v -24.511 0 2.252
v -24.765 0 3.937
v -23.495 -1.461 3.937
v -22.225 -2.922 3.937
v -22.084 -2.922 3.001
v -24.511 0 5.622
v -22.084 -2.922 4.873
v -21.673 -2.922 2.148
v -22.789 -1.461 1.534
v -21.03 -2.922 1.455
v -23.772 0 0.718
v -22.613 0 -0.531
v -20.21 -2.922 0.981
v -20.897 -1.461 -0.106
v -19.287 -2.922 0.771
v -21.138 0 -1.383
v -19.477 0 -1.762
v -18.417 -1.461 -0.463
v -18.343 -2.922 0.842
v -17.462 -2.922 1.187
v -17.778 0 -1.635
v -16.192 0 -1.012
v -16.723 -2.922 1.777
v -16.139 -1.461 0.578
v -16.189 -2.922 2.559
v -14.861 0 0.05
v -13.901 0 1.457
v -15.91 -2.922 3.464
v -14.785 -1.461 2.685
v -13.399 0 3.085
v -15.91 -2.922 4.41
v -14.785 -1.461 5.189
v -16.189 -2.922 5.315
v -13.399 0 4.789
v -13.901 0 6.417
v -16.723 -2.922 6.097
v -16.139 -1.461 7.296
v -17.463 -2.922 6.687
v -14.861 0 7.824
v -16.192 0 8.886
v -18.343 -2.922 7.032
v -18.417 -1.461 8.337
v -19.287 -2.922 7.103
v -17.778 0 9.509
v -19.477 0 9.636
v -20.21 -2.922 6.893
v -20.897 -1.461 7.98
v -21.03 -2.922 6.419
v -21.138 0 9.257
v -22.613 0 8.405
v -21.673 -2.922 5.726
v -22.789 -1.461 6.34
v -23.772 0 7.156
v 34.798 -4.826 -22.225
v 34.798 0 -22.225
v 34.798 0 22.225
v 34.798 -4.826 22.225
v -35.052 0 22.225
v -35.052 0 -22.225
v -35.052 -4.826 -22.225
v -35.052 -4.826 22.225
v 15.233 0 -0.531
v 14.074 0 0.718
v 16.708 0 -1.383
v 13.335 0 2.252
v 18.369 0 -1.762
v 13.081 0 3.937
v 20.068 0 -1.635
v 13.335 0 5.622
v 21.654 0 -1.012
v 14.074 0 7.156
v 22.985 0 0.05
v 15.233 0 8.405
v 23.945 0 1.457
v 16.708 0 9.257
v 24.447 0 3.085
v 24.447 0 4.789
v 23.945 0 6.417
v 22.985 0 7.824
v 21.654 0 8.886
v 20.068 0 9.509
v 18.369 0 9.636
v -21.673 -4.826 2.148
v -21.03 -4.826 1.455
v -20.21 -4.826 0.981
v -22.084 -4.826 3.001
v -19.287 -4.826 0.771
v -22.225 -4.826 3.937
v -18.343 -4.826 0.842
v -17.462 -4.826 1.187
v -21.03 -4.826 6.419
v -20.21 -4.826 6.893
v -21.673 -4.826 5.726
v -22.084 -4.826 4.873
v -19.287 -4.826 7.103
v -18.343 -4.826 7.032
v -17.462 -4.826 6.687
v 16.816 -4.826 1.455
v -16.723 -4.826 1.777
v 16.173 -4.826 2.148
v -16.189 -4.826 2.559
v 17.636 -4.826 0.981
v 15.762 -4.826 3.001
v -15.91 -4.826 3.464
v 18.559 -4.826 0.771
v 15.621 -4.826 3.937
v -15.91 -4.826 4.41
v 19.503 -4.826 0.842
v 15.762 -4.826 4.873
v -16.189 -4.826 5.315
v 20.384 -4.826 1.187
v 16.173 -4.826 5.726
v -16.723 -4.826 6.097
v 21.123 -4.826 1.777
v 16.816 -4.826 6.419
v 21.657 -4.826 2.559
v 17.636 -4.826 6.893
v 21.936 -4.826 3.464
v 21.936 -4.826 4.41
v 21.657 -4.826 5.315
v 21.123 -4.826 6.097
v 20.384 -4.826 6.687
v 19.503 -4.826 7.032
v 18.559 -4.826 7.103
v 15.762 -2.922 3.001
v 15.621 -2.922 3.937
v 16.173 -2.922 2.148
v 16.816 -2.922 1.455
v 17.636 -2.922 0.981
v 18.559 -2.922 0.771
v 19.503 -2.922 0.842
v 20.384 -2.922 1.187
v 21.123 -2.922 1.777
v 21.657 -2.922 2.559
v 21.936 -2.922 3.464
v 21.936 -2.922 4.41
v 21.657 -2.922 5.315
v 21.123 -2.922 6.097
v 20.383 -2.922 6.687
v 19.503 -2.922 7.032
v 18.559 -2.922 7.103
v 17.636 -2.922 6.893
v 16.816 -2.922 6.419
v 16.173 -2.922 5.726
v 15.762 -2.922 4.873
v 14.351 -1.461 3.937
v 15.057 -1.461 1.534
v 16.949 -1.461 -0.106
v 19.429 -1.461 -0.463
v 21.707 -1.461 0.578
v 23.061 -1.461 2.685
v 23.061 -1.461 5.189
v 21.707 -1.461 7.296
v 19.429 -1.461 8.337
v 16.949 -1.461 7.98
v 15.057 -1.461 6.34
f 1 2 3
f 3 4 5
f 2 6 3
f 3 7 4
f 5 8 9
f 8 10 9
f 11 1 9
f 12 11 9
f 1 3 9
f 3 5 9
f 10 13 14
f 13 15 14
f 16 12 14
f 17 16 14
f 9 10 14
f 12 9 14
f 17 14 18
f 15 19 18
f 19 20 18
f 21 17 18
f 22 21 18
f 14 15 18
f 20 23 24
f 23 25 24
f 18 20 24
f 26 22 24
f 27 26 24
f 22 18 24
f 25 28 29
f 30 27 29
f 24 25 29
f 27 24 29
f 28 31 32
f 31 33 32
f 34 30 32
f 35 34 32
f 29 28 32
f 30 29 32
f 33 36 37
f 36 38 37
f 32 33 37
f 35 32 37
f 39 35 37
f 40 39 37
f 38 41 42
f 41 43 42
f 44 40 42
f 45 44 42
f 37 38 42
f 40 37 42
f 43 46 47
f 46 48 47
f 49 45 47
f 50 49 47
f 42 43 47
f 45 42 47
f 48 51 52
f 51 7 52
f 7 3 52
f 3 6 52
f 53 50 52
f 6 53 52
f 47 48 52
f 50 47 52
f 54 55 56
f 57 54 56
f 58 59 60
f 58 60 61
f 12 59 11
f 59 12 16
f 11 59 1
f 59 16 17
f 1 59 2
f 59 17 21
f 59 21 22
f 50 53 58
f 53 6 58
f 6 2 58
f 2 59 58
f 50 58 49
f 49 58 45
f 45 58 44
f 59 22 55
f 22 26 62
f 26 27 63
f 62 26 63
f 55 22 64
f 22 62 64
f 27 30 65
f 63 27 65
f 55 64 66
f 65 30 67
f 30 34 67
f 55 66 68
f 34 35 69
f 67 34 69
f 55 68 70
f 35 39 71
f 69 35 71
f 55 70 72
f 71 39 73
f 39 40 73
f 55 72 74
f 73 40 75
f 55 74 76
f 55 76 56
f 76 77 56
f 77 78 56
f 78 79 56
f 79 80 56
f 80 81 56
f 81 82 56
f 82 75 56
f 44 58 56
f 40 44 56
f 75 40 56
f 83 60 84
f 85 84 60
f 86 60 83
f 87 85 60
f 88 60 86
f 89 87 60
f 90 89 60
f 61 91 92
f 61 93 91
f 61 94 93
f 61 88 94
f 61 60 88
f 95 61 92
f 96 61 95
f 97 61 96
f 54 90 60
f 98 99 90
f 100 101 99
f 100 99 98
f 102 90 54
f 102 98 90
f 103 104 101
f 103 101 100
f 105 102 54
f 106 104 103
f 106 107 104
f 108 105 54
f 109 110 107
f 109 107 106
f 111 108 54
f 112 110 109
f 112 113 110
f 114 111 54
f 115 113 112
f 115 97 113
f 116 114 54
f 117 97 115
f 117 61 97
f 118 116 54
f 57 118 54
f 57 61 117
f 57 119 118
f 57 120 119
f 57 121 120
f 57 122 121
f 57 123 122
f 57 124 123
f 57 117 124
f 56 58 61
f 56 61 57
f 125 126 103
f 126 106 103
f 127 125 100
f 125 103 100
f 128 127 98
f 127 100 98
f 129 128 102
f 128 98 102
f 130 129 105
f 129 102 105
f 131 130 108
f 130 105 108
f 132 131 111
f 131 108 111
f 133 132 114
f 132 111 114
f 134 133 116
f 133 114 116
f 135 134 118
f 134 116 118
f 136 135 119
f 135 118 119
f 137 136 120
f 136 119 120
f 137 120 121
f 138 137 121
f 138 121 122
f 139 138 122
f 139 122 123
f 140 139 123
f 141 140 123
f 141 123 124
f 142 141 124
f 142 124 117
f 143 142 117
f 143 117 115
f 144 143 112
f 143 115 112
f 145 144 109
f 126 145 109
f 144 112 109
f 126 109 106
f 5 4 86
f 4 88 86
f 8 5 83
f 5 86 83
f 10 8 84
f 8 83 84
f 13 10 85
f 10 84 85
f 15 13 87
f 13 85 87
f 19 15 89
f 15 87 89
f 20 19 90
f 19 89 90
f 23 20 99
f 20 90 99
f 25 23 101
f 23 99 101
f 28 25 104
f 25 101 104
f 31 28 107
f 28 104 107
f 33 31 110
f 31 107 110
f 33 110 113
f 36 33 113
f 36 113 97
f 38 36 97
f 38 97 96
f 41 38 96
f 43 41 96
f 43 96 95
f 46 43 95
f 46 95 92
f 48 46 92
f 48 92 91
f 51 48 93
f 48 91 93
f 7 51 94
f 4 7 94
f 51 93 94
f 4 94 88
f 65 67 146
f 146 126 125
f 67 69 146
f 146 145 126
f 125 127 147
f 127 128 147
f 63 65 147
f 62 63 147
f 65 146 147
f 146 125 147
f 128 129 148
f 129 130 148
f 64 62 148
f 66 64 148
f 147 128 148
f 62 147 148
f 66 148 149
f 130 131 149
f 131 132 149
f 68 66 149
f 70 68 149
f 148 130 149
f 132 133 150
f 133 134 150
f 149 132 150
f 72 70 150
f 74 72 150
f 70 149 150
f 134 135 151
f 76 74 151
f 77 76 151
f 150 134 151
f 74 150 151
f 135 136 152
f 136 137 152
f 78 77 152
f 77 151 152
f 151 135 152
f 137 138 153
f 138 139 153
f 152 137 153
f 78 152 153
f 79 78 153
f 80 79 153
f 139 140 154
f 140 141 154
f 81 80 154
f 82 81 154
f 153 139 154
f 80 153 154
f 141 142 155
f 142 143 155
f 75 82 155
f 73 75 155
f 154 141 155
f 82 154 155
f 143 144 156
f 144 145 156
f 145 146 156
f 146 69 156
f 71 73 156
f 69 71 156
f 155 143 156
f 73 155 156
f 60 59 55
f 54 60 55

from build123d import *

# Parameters (mm, degrees)
F0_W           = 69.85
F0_H           = 44.45
F1_DEPTH       = 4.826
F2_D           = 6.35
F2_CSINK_D     = 11.43
F2_CSINK_ANGLE = 82


with BuildPart() as f1:
    # F0 (on Front) → F1 (new body)
    with BuildSketch(Plane.XZ):
        with Locations((-0.127, 0)):
            Rectangle(F0_W, F0_H)
    extrude(amount=F1_DEPTH)

    # F2 (through all)
    with Locations(Plane(origin=(0, 0, 0), x_dir=(1, 0, 0), z_dir=(0, 1, 0))):
        with Locations((-19.05, -3.937), (18.796, -3.937)):
            CounterSinkHole(F2_D / 2, F2_CSINK_D / 2, counter_sink_angle=F2_CSINK_ANGLE)


solid = f1.part
